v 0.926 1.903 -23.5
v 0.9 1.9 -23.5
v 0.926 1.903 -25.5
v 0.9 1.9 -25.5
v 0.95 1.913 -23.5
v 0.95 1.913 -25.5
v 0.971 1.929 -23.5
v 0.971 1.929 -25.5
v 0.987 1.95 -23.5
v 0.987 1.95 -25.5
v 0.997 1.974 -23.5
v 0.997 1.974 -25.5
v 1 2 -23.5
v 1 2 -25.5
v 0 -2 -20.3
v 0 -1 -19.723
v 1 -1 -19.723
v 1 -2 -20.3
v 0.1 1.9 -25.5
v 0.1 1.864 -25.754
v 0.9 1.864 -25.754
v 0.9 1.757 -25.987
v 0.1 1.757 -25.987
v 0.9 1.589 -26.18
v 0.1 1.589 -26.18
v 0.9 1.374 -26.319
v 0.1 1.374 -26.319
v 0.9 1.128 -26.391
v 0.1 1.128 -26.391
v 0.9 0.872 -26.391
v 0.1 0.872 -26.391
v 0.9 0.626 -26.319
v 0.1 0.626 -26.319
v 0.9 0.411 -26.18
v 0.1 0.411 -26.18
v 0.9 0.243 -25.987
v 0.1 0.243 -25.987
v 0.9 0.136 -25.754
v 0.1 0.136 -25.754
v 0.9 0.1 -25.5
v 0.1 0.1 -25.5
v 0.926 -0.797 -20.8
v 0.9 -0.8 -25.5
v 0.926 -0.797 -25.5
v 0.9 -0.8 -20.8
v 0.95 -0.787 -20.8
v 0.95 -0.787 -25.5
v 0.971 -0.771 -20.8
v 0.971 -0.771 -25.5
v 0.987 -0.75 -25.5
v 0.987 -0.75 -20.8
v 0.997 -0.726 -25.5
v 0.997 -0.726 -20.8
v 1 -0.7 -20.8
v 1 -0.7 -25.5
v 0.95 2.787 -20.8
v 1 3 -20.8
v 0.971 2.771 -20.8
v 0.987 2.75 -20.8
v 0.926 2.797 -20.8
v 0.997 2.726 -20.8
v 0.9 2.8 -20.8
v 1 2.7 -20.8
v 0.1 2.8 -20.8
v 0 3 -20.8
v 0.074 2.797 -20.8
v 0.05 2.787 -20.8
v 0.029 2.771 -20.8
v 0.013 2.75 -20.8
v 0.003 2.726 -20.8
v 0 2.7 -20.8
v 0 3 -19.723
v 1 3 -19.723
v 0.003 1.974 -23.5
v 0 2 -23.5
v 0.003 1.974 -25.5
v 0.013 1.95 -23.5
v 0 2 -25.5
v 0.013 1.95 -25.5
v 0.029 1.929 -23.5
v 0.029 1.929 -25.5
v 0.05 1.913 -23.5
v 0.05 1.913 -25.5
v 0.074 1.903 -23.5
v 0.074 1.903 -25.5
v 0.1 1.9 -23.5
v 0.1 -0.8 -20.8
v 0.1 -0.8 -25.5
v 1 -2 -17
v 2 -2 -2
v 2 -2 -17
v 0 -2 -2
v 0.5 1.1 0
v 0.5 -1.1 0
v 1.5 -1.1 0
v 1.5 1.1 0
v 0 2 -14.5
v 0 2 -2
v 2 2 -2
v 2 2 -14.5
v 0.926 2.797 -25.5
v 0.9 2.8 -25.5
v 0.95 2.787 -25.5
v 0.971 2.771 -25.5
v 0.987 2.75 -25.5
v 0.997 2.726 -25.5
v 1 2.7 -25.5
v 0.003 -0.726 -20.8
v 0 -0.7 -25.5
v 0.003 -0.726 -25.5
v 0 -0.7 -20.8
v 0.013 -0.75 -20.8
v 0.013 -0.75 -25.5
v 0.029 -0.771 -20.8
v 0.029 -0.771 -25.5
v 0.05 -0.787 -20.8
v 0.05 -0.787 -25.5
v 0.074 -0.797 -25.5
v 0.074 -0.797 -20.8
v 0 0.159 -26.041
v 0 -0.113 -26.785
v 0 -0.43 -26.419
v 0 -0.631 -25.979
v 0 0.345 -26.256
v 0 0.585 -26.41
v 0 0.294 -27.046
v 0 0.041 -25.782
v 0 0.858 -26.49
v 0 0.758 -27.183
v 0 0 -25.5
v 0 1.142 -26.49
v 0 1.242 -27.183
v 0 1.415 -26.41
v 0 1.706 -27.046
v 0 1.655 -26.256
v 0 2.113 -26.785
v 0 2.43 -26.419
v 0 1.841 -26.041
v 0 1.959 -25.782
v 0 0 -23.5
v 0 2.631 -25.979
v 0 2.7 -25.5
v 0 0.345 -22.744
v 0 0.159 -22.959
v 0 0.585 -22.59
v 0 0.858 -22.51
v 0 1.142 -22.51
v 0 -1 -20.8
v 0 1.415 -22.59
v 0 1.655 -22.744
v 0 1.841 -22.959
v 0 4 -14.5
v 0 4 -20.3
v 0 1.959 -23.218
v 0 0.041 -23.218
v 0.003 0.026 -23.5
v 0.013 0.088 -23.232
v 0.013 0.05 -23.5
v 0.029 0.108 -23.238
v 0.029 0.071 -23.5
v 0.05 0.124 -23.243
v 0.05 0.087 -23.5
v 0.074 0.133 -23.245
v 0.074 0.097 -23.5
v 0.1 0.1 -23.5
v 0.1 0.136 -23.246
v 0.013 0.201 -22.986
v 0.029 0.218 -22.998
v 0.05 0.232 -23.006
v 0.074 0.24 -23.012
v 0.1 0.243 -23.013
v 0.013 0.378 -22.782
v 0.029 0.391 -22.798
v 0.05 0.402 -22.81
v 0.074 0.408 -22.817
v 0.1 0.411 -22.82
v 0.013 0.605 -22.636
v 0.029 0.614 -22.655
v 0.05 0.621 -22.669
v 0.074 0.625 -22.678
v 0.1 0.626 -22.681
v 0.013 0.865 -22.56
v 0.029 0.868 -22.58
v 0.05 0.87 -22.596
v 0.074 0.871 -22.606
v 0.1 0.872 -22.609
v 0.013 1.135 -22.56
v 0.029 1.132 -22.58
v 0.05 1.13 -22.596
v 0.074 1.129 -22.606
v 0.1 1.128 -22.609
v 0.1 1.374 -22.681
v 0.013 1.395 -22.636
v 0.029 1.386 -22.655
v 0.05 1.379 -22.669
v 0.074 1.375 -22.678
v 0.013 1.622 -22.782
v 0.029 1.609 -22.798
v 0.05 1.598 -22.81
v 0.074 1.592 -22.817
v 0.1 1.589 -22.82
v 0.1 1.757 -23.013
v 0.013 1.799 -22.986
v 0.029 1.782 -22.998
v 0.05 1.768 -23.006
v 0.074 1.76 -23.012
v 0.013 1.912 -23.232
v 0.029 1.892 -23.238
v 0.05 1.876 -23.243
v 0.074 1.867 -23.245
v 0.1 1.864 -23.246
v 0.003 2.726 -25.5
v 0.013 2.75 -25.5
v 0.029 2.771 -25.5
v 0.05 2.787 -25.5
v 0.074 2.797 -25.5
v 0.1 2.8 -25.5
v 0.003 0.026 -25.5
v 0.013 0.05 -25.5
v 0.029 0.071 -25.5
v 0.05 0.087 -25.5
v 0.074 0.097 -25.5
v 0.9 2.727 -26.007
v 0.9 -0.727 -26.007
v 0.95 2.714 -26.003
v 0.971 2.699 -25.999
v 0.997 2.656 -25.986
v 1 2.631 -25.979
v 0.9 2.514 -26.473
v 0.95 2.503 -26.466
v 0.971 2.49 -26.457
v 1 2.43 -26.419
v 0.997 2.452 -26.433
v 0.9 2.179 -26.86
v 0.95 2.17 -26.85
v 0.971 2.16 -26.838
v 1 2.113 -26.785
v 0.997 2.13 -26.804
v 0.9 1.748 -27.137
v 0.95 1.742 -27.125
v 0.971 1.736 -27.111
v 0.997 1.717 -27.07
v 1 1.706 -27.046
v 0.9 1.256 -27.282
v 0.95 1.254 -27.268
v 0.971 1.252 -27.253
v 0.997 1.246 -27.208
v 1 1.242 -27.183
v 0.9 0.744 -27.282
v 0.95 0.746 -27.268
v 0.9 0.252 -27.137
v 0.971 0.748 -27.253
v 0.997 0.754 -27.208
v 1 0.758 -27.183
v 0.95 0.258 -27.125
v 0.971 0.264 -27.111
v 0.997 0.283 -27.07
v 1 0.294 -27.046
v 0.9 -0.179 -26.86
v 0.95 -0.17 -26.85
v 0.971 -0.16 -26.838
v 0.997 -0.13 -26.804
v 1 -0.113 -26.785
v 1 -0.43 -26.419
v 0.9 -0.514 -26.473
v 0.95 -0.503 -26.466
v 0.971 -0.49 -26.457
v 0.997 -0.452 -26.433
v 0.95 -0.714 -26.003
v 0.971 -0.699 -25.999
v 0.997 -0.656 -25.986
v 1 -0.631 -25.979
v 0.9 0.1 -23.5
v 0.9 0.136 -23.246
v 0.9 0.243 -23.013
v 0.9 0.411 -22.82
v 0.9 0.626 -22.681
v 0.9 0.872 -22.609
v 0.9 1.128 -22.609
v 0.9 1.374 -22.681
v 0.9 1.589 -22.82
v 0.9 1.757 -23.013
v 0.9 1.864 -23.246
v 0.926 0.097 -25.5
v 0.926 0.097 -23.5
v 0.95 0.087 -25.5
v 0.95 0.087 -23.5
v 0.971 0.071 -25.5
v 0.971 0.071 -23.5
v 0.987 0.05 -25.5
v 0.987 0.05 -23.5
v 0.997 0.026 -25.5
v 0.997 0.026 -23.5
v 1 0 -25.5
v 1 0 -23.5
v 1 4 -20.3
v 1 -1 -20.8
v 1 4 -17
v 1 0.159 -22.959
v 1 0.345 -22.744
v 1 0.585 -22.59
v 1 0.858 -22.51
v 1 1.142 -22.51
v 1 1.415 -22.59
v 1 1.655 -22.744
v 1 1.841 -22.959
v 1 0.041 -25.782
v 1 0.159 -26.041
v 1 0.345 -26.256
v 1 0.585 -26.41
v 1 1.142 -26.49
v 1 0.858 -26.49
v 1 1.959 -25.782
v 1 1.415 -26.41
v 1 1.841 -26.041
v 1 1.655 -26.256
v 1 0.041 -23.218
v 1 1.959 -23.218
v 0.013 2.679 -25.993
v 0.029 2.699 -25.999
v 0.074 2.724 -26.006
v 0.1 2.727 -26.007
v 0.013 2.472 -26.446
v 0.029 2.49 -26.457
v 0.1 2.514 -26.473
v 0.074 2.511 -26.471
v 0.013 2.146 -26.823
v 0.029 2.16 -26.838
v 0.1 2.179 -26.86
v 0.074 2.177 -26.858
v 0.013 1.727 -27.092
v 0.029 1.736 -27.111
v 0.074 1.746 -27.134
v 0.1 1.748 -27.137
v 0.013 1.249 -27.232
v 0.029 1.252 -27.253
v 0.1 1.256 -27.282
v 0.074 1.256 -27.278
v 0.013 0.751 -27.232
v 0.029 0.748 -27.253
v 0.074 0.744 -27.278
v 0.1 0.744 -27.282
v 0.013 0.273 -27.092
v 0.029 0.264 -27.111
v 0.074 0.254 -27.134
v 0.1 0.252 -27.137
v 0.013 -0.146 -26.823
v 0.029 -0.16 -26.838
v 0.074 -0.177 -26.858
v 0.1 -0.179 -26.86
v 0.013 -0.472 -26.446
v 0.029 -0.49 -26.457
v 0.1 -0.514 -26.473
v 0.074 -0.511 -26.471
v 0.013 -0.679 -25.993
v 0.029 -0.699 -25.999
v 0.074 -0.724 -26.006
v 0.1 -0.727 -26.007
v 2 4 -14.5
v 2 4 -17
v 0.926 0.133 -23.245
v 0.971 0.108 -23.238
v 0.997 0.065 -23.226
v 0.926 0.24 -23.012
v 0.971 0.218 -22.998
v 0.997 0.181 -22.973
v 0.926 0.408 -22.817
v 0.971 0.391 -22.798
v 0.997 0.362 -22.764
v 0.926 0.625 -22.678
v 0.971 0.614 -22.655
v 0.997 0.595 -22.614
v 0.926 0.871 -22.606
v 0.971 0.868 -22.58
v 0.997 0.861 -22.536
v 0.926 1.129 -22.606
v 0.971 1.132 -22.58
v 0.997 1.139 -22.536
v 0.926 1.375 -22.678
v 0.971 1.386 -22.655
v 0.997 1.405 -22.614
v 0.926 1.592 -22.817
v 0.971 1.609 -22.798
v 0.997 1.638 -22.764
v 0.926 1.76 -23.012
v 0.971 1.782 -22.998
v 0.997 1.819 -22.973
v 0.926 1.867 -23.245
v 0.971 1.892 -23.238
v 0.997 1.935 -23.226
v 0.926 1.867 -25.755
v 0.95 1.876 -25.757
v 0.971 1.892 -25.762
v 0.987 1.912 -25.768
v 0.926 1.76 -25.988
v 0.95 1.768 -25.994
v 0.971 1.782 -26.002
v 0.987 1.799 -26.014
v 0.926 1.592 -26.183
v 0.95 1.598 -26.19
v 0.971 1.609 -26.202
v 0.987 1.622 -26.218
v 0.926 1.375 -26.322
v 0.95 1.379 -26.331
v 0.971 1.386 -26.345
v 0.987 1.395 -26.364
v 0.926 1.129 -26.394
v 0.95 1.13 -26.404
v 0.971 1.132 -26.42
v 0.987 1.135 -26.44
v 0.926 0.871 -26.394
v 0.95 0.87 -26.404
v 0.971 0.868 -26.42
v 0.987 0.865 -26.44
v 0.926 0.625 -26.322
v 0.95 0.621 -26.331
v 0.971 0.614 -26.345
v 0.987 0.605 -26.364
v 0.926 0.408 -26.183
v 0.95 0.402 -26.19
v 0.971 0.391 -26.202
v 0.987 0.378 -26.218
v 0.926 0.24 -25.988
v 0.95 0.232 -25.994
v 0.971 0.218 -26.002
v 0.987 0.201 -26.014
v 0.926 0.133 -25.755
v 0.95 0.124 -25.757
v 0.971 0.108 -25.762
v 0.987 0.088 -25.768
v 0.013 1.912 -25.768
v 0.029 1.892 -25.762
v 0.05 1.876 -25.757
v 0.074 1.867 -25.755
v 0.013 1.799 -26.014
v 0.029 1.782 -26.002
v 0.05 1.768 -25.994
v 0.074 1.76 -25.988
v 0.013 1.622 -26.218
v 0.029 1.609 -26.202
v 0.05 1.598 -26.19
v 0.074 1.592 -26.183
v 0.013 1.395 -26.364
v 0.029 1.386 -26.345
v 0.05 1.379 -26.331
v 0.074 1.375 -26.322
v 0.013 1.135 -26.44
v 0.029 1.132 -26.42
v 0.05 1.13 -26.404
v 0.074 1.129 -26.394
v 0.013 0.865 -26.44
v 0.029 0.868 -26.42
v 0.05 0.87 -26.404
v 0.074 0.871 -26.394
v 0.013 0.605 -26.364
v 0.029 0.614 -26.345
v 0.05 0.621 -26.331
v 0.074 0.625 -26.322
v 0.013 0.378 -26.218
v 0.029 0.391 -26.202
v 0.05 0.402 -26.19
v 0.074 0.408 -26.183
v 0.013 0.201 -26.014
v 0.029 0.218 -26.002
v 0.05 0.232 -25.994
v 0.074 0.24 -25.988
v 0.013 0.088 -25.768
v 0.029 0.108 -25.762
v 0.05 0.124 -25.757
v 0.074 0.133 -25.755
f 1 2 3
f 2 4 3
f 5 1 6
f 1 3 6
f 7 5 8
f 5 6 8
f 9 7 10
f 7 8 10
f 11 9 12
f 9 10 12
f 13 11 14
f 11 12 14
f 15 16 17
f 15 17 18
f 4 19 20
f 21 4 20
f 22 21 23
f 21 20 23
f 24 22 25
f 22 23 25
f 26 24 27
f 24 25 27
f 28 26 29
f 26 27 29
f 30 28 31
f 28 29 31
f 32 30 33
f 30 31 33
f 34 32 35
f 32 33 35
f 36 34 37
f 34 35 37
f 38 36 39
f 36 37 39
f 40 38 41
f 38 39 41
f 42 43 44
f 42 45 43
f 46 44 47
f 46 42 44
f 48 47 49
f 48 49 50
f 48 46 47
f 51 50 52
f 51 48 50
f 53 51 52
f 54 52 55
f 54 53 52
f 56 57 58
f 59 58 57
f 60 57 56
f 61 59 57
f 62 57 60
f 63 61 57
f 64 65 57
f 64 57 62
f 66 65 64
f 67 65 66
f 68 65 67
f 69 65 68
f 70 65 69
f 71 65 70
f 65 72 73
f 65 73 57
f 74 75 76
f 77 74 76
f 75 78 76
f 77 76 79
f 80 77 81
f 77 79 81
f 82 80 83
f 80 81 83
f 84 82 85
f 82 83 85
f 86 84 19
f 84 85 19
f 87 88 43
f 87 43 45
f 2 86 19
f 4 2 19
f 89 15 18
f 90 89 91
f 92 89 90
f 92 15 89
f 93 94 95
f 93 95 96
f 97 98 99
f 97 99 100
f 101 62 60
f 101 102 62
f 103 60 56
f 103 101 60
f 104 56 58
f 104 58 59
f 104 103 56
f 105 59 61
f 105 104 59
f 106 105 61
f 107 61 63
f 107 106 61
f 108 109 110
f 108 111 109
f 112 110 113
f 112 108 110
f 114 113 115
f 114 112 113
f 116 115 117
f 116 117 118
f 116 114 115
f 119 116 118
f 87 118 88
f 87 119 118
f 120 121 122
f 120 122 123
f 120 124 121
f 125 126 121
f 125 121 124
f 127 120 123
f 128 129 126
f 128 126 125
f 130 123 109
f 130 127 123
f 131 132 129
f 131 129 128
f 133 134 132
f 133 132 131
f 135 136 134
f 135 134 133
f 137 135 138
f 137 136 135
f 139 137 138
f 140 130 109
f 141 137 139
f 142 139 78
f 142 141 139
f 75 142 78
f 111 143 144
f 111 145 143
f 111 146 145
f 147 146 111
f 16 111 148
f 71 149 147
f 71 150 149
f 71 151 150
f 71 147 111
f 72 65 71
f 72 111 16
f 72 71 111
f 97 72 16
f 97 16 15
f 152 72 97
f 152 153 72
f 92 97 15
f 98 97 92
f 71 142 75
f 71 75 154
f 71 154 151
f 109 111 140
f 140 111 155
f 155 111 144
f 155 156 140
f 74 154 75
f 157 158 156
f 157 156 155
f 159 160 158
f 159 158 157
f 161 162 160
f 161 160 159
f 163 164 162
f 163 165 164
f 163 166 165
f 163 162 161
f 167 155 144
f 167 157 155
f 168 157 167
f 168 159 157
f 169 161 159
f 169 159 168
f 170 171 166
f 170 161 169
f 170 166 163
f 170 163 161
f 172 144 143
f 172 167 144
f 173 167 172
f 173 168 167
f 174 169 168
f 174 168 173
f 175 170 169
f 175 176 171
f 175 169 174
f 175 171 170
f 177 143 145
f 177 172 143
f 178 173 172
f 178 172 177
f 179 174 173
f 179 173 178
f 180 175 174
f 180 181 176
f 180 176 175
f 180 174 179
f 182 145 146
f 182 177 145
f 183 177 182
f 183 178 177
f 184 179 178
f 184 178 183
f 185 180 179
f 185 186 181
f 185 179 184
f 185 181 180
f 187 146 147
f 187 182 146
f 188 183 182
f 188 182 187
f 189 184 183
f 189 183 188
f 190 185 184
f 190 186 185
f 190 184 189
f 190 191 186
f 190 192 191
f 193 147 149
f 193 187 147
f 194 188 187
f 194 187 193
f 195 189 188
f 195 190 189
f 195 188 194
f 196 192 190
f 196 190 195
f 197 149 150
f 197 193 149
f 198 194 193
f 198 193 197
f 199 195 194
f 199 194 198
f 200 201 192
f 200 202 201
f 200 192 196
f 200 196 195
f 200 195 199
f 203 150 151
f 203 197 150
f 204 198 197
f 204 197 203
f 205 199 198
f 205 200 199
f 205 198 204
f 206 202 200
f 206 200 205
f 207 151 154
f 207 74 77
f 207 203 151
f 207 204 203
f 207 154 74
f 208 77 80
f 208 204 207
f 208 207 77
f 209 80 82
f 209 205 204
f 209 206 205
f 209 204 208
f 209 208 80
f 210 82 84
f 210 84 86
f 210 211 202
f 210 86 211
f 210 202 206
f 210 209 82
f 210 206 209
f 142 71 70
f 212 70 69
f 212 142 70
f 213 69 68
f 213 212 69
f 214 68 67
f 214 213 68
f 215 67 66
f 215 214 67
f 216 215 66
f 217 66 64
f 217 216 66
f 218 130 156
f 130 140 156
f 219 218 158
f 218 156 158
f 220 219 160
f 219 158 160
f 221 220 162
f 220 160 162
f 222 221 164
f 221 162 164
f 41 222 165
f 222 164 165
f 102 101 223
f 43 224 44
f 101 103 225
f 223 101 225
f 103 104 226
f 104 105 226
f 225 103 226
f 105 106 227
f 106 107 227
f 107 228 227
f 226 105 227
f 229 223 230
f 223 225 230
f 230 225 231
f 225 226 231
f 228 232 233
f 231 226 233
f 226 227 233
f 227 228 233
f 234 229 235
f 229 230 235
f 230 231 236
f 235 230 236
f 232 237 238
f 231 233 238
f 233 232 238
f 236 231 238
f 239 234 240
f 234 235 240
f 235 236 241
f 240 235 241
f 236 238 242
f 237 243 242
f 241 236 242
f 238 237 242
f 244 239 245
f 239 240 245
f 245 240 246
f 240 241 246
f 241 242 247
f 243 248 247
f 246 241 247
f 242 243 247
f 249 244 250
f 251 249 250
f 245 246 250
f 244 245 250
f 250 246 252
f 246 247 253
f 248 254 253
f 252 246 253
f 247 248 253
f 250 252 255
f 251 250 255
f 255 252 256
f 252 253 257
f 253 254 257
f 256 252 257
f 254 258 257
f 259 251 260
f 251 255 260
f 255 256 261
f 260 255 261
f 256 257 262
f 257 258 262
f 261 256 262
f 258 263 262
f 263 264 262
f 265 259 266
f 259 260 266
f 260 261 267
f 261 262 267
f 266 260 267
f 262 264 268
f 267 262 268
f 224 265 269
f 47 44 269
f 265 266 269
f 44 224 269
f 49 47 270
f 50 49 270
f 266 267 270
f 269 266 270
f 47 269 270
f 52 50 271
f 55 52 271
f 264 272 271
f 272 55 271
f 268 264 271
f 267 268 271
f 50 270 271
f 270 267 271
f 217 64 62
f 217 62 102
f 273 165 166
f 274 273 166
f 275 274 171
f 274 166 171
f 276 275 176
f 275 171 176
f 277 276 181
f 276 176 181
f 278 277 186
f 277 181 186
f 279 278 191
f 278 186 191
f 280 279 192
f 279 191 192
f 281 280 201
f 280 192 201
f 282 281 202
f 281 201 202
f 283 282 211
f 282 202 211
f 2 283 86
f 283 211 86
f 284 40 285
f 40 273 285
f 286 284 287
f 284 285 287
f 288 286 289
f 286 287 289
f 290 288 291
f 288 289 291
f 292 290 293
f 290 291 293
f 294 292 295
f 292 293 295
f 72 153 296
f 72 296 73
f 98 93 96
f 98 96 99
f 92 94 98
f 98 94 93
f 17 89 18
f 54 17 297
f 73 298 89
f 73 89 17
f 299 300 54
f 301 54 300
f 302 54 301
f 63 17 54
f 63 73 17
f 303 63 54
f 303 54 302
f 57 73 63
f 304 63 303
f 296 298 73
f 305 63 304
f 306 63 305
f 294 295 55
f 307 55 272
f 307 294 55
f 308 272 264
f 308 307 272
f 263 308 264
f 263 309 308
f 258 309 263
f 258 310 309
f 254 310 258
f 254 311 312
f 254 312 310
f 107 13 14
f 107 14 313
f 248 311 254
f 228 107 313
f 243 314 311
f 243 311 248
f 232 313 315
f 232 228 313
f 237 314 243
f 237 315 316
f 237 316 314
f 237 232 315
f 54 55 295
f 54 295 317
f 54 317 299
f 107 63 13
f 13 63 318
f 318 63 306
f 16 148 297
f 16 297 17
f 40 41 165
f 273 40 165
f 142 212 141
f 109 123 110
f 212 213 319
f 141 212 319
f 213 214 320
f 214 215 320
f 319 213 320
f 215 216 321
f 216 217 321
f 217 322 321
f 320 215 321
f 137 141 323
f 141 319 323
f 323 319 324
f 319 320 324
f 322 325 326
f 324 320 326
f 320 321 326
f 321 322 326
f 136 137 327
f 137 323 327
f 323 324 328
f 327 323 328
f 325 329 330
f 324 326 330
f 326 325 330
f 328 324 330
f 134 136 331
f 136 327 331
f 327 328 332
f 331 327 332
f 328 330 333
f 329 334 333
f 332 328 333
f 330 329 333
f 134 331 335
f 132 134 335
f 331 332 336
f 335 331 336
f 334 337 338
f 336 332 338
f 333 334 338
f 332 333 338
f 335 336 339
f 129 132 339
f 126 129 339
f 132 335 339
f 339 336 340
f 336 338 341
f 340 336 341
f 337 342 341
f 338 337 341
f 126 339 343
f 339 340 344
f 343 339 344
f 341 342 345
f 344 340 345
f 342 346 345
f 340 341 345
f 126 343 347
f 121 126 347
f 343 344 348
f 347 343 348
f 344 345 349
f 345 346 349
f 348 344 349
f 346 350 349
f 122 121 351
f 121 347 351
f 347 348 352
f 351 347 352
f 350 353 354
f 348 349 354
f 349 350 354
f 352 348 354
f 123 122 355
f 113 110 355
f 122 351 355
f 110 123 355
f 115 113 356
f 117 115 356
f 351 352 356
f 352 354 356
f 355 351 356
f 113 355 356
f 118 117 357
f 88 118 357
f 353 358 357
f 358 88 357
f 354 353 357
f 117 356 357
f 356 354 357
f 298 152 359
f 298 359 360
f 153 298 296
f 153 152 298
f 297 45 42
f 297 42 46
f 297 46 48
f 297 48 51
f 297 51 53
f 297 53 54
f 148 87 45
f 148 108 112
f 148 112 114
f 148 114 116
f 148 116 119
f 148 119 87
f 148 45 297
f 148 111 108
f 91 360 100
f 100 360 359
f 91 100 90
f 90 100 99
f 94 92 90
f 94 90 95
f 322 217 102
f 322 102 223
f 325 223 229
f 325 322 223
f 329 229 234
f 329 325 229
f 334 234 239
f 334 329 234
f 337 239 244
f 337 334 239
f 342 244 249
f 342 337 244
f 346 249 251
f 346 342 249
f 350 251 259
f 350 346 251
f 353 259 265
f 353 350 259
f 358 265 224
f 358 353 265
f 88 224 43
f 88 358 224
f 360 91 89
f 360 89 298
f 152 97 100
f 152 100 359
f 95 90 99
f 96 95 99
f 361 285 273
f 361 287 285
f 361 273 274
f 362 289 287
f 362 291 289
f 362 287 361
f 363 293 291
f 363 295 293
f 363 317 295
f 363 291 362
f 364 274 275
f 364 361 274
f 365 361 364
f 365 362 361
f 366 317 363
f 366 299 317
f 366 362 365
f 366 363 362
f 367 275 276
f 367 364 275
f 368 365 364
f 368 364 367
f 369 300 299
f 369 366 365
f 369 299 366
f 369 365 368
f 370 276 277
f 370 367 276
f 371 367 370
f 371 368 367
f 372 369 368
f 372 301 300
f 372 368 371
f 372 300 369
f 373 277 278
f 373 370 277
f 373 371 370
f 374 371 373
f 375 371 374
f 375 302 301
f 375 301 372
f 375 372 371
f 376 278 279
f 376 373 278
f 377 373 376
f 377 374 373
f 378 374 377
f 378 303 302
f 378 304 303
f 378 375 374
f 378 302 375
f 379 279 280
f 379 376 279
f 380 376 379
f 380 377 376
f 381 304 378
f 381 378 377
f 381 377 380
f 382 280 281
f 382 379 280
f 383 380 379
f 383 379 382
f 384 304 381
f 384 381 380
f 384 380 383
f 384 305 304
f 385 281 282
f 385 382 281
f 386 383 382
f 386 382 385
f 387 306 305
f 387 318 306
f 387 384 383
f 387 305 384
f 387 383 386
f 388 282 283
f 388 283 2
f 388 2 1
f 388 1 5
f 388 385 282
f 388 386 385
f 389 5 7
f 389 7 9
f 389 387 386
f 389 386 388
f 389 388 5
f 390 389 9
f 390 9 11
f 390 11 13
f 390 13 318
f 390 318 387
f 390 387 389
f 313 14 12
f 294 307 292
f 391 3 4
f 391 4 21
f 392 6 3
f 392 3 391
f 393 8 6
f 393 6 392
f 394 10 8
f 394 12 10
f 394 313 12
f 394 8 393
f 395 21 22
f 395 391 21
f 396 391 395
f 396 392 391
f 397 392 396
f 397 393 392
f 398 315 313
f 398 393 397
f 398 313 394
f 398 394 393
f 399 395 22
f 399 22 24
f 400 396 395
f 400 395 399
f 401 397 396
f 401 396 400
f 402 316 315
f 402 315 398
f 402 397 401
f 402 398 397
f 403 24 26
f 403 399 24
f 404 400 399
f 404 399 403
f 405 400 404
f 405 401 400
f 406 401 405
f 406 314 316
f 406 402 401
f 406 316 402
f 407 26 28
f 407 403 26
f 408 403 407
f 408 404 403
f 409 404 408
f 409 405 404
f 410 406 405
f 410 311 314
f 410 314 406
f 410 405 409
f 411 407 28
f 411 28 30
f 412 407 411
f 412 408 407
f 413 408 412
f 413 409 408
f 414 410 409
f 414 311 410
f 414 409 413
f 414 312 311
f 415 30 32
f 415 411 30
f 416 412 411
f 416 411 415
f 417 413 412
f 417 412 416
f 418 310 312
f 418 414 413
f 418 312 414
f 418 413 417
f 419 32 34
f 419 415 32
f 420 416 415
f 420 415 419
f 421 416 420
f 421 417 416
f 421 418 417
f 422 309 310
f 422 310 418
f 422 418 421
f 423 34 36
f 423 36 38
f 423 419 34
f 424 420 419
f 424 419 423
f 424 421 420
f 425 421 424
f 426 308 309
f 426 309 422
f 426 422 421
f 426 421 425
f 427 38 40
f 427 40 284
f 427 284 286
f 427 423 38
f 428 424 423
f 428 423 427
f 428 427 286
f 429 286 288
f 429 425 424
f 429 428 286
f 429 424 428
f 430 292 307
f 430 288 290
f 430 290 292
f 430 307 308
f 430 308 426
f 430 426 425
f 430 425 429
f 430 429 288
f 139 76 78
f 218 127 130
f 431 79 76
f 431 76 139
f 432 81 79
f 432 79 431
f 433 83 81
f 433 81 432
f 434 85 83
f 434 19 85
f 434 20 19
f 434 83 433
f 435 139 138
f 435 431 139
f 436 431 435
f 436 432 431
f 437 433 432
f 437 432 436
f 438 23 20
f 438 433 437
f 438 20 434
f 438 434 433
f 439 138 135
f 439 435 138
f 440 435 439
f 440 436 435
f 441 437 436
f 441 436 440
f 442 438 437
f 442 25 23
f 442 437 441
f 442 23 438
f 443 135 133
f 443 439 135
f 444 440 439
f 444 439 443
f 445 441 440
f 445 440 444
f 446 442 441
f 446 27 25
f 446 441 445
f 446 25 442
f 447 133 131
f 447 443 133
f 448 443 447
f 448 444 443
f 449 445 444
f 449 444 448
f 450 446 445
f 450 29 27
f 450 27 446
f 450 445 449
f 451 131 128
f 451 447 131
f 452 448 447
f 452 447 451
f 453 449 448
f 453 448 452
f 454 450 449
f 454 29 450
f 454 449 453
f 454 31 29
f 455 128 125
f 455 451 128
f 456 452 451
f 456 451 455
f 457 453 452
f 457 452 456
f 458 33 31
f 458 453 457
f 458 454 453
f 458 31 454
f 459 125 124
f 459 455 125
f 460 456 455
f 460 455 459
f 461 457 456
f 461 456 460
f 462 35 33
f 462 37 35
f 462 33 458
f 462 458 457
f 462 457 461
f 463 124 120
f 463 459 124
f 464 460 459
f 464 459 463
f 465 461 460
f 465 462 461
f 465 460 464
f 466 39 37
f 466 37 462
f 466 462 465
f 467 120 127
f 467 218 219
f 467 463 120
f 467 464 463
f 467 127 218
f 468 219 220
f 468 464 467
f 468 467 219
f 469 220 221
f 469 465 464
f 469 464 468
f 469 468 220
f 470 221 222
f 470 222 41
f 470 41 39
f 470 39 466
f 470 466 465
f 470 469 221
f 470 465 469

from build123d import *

# Parameters (mm, degrees)
EXTRUDE_1_DEPTH     = 2
SKETCH_2_W          = 12.24406528
SKETCH_2_H          = 8.971692278
CUT_EXTRUDE_1_DEPTH = 1
CHAMFER_1_SIZE      = 0.5
CHAMFER_1_SIZE2     = 2
CHAMFER_2_SIZE      = 2
CHAMFER_2_SIZE2     = 0.5
FILLET_1_R          = 0.1


with BuildPart() as part:
    # Эскиз1 → Бобышка-Вытянуть1 (new body)
    with BuildSketch(Plane(origin=(0, 0, 0), x_dir=(0, 0, -1), z_dir=(1, 0, 0))):
        with BuildLine():
            Line((0, 0), (0, 1.1))
            Line((0, 1.1), (2, 2))
            Line((2, 2), (14.5, 2))
            Line((14.5, 2), (14.5, 4))
            Line((14.5, 4), (20.3, 4))
            Line((20.3, 4), (19.722649731, 3))
            Line((19.722649731, 3), (20.8, 3))
            Line((20.8, 3), (20.8, 2.8))
            Line((20.8, 2.8), (25.5, 2.8))
            ThreePointArc((25.5, 2.8), (27.3, 1), (25.5, -0.8))
            Line((25.5, -0.8), (20.8, -0.8))
            Line((20.8, -0.8), (20.8, -1))
            Line((20.8, -1), (19.722649731, -1))
            Line((19.722649731, -1), (20.3, -2))
            Line((20.3, -2), (2, -2))
            Line((2, -2), (0, -1.1))
            Line((0, -1.1), (0, 0))
        make_face()
        with BuildLine():
            Line((23.5, 1.9), (25.5, 1.9))
            ThreePointArc((25.5, 1.9), (26.4, 1), (25.5, 0.1))
            Line((25.5, 0.1), (23.5, 0.1))
            ThreePointArc((23.5, 0.1), (22.6, 1), (23.5, 1.9))
        make_face(mode=Mode.SUBTRACT)
    extrude(amount=EXTRUDE_1_DEPTH)

    # Эскиз2 → Вырез-Вытянуть1 (cut)
    with BuildSketch(Plane(origin=(2, 0, 0), x_dir=(0, 0, -1), z_dir=(1, 0, 0))):
        with Locations((23.12203264, 1.144281601)):
            Rectangle(SKETCH_2_W, SKETCH_2_H)
    extrude(amount=-CUT_EXTRUDE_1_DEPTH, mode=Mode.SUBTRACT)

    # Фаска1
    chamfer_1_edges = [part.edges().sort_by_distance(p)[0] for p in [
        (2, 0, 0),
    ]]
    chamfer_1_side = [part.faces().sort_by_distance(p)[0] for p in [
        (1, 0, 0),
    ]]
    chamfer(chamfer_1_edges, length=CHAMFER_1_SIZE, length2=CHAMFER_1_SIZE2, reference=chamfer_1_side[0])

    # Фаска2
    chamfer_2_edges = [part.edges().sort_by_distance(p)[0] for p in [
        (0, 0, 0),
    ]]
    chamfer_2_side = [part.faces().sort_by_distance(p)[0] for p in [
        (0, 0.481010429, -13.197583299),
    ]]
    chamfer(chamfer_2_edges, length=CHAMFER_2_SIZE, length2=CHAMFER_2_SIZE2, reference=chamfer_2_side[0])

    # Скругление1
    fillet_1_edges = [part.edges().sort_by_distance(p)[0] for p in [
        (0, 2.8, -23.15),
        (0, 1, -27.3),
        (0, -0.8, -23.15),
        (0, 1, -22.6),
        (0, 0.1, -24.5),
        (0, 1, -26.4),
        (0, 1.9, -24.5),
        (1, 1.9, -24.5),
        (1, 1, -22.6),
        (1, 0.1, -24.5),
        (1, 1, -26.4),
        (1, -0.8, -23.15),
        (1, 1, -27.3),
        (1, 2.8, -23.15),
    ]]
    fillet(fillet_1_edges, radius=FILLET_1_R)


solid = part.part
